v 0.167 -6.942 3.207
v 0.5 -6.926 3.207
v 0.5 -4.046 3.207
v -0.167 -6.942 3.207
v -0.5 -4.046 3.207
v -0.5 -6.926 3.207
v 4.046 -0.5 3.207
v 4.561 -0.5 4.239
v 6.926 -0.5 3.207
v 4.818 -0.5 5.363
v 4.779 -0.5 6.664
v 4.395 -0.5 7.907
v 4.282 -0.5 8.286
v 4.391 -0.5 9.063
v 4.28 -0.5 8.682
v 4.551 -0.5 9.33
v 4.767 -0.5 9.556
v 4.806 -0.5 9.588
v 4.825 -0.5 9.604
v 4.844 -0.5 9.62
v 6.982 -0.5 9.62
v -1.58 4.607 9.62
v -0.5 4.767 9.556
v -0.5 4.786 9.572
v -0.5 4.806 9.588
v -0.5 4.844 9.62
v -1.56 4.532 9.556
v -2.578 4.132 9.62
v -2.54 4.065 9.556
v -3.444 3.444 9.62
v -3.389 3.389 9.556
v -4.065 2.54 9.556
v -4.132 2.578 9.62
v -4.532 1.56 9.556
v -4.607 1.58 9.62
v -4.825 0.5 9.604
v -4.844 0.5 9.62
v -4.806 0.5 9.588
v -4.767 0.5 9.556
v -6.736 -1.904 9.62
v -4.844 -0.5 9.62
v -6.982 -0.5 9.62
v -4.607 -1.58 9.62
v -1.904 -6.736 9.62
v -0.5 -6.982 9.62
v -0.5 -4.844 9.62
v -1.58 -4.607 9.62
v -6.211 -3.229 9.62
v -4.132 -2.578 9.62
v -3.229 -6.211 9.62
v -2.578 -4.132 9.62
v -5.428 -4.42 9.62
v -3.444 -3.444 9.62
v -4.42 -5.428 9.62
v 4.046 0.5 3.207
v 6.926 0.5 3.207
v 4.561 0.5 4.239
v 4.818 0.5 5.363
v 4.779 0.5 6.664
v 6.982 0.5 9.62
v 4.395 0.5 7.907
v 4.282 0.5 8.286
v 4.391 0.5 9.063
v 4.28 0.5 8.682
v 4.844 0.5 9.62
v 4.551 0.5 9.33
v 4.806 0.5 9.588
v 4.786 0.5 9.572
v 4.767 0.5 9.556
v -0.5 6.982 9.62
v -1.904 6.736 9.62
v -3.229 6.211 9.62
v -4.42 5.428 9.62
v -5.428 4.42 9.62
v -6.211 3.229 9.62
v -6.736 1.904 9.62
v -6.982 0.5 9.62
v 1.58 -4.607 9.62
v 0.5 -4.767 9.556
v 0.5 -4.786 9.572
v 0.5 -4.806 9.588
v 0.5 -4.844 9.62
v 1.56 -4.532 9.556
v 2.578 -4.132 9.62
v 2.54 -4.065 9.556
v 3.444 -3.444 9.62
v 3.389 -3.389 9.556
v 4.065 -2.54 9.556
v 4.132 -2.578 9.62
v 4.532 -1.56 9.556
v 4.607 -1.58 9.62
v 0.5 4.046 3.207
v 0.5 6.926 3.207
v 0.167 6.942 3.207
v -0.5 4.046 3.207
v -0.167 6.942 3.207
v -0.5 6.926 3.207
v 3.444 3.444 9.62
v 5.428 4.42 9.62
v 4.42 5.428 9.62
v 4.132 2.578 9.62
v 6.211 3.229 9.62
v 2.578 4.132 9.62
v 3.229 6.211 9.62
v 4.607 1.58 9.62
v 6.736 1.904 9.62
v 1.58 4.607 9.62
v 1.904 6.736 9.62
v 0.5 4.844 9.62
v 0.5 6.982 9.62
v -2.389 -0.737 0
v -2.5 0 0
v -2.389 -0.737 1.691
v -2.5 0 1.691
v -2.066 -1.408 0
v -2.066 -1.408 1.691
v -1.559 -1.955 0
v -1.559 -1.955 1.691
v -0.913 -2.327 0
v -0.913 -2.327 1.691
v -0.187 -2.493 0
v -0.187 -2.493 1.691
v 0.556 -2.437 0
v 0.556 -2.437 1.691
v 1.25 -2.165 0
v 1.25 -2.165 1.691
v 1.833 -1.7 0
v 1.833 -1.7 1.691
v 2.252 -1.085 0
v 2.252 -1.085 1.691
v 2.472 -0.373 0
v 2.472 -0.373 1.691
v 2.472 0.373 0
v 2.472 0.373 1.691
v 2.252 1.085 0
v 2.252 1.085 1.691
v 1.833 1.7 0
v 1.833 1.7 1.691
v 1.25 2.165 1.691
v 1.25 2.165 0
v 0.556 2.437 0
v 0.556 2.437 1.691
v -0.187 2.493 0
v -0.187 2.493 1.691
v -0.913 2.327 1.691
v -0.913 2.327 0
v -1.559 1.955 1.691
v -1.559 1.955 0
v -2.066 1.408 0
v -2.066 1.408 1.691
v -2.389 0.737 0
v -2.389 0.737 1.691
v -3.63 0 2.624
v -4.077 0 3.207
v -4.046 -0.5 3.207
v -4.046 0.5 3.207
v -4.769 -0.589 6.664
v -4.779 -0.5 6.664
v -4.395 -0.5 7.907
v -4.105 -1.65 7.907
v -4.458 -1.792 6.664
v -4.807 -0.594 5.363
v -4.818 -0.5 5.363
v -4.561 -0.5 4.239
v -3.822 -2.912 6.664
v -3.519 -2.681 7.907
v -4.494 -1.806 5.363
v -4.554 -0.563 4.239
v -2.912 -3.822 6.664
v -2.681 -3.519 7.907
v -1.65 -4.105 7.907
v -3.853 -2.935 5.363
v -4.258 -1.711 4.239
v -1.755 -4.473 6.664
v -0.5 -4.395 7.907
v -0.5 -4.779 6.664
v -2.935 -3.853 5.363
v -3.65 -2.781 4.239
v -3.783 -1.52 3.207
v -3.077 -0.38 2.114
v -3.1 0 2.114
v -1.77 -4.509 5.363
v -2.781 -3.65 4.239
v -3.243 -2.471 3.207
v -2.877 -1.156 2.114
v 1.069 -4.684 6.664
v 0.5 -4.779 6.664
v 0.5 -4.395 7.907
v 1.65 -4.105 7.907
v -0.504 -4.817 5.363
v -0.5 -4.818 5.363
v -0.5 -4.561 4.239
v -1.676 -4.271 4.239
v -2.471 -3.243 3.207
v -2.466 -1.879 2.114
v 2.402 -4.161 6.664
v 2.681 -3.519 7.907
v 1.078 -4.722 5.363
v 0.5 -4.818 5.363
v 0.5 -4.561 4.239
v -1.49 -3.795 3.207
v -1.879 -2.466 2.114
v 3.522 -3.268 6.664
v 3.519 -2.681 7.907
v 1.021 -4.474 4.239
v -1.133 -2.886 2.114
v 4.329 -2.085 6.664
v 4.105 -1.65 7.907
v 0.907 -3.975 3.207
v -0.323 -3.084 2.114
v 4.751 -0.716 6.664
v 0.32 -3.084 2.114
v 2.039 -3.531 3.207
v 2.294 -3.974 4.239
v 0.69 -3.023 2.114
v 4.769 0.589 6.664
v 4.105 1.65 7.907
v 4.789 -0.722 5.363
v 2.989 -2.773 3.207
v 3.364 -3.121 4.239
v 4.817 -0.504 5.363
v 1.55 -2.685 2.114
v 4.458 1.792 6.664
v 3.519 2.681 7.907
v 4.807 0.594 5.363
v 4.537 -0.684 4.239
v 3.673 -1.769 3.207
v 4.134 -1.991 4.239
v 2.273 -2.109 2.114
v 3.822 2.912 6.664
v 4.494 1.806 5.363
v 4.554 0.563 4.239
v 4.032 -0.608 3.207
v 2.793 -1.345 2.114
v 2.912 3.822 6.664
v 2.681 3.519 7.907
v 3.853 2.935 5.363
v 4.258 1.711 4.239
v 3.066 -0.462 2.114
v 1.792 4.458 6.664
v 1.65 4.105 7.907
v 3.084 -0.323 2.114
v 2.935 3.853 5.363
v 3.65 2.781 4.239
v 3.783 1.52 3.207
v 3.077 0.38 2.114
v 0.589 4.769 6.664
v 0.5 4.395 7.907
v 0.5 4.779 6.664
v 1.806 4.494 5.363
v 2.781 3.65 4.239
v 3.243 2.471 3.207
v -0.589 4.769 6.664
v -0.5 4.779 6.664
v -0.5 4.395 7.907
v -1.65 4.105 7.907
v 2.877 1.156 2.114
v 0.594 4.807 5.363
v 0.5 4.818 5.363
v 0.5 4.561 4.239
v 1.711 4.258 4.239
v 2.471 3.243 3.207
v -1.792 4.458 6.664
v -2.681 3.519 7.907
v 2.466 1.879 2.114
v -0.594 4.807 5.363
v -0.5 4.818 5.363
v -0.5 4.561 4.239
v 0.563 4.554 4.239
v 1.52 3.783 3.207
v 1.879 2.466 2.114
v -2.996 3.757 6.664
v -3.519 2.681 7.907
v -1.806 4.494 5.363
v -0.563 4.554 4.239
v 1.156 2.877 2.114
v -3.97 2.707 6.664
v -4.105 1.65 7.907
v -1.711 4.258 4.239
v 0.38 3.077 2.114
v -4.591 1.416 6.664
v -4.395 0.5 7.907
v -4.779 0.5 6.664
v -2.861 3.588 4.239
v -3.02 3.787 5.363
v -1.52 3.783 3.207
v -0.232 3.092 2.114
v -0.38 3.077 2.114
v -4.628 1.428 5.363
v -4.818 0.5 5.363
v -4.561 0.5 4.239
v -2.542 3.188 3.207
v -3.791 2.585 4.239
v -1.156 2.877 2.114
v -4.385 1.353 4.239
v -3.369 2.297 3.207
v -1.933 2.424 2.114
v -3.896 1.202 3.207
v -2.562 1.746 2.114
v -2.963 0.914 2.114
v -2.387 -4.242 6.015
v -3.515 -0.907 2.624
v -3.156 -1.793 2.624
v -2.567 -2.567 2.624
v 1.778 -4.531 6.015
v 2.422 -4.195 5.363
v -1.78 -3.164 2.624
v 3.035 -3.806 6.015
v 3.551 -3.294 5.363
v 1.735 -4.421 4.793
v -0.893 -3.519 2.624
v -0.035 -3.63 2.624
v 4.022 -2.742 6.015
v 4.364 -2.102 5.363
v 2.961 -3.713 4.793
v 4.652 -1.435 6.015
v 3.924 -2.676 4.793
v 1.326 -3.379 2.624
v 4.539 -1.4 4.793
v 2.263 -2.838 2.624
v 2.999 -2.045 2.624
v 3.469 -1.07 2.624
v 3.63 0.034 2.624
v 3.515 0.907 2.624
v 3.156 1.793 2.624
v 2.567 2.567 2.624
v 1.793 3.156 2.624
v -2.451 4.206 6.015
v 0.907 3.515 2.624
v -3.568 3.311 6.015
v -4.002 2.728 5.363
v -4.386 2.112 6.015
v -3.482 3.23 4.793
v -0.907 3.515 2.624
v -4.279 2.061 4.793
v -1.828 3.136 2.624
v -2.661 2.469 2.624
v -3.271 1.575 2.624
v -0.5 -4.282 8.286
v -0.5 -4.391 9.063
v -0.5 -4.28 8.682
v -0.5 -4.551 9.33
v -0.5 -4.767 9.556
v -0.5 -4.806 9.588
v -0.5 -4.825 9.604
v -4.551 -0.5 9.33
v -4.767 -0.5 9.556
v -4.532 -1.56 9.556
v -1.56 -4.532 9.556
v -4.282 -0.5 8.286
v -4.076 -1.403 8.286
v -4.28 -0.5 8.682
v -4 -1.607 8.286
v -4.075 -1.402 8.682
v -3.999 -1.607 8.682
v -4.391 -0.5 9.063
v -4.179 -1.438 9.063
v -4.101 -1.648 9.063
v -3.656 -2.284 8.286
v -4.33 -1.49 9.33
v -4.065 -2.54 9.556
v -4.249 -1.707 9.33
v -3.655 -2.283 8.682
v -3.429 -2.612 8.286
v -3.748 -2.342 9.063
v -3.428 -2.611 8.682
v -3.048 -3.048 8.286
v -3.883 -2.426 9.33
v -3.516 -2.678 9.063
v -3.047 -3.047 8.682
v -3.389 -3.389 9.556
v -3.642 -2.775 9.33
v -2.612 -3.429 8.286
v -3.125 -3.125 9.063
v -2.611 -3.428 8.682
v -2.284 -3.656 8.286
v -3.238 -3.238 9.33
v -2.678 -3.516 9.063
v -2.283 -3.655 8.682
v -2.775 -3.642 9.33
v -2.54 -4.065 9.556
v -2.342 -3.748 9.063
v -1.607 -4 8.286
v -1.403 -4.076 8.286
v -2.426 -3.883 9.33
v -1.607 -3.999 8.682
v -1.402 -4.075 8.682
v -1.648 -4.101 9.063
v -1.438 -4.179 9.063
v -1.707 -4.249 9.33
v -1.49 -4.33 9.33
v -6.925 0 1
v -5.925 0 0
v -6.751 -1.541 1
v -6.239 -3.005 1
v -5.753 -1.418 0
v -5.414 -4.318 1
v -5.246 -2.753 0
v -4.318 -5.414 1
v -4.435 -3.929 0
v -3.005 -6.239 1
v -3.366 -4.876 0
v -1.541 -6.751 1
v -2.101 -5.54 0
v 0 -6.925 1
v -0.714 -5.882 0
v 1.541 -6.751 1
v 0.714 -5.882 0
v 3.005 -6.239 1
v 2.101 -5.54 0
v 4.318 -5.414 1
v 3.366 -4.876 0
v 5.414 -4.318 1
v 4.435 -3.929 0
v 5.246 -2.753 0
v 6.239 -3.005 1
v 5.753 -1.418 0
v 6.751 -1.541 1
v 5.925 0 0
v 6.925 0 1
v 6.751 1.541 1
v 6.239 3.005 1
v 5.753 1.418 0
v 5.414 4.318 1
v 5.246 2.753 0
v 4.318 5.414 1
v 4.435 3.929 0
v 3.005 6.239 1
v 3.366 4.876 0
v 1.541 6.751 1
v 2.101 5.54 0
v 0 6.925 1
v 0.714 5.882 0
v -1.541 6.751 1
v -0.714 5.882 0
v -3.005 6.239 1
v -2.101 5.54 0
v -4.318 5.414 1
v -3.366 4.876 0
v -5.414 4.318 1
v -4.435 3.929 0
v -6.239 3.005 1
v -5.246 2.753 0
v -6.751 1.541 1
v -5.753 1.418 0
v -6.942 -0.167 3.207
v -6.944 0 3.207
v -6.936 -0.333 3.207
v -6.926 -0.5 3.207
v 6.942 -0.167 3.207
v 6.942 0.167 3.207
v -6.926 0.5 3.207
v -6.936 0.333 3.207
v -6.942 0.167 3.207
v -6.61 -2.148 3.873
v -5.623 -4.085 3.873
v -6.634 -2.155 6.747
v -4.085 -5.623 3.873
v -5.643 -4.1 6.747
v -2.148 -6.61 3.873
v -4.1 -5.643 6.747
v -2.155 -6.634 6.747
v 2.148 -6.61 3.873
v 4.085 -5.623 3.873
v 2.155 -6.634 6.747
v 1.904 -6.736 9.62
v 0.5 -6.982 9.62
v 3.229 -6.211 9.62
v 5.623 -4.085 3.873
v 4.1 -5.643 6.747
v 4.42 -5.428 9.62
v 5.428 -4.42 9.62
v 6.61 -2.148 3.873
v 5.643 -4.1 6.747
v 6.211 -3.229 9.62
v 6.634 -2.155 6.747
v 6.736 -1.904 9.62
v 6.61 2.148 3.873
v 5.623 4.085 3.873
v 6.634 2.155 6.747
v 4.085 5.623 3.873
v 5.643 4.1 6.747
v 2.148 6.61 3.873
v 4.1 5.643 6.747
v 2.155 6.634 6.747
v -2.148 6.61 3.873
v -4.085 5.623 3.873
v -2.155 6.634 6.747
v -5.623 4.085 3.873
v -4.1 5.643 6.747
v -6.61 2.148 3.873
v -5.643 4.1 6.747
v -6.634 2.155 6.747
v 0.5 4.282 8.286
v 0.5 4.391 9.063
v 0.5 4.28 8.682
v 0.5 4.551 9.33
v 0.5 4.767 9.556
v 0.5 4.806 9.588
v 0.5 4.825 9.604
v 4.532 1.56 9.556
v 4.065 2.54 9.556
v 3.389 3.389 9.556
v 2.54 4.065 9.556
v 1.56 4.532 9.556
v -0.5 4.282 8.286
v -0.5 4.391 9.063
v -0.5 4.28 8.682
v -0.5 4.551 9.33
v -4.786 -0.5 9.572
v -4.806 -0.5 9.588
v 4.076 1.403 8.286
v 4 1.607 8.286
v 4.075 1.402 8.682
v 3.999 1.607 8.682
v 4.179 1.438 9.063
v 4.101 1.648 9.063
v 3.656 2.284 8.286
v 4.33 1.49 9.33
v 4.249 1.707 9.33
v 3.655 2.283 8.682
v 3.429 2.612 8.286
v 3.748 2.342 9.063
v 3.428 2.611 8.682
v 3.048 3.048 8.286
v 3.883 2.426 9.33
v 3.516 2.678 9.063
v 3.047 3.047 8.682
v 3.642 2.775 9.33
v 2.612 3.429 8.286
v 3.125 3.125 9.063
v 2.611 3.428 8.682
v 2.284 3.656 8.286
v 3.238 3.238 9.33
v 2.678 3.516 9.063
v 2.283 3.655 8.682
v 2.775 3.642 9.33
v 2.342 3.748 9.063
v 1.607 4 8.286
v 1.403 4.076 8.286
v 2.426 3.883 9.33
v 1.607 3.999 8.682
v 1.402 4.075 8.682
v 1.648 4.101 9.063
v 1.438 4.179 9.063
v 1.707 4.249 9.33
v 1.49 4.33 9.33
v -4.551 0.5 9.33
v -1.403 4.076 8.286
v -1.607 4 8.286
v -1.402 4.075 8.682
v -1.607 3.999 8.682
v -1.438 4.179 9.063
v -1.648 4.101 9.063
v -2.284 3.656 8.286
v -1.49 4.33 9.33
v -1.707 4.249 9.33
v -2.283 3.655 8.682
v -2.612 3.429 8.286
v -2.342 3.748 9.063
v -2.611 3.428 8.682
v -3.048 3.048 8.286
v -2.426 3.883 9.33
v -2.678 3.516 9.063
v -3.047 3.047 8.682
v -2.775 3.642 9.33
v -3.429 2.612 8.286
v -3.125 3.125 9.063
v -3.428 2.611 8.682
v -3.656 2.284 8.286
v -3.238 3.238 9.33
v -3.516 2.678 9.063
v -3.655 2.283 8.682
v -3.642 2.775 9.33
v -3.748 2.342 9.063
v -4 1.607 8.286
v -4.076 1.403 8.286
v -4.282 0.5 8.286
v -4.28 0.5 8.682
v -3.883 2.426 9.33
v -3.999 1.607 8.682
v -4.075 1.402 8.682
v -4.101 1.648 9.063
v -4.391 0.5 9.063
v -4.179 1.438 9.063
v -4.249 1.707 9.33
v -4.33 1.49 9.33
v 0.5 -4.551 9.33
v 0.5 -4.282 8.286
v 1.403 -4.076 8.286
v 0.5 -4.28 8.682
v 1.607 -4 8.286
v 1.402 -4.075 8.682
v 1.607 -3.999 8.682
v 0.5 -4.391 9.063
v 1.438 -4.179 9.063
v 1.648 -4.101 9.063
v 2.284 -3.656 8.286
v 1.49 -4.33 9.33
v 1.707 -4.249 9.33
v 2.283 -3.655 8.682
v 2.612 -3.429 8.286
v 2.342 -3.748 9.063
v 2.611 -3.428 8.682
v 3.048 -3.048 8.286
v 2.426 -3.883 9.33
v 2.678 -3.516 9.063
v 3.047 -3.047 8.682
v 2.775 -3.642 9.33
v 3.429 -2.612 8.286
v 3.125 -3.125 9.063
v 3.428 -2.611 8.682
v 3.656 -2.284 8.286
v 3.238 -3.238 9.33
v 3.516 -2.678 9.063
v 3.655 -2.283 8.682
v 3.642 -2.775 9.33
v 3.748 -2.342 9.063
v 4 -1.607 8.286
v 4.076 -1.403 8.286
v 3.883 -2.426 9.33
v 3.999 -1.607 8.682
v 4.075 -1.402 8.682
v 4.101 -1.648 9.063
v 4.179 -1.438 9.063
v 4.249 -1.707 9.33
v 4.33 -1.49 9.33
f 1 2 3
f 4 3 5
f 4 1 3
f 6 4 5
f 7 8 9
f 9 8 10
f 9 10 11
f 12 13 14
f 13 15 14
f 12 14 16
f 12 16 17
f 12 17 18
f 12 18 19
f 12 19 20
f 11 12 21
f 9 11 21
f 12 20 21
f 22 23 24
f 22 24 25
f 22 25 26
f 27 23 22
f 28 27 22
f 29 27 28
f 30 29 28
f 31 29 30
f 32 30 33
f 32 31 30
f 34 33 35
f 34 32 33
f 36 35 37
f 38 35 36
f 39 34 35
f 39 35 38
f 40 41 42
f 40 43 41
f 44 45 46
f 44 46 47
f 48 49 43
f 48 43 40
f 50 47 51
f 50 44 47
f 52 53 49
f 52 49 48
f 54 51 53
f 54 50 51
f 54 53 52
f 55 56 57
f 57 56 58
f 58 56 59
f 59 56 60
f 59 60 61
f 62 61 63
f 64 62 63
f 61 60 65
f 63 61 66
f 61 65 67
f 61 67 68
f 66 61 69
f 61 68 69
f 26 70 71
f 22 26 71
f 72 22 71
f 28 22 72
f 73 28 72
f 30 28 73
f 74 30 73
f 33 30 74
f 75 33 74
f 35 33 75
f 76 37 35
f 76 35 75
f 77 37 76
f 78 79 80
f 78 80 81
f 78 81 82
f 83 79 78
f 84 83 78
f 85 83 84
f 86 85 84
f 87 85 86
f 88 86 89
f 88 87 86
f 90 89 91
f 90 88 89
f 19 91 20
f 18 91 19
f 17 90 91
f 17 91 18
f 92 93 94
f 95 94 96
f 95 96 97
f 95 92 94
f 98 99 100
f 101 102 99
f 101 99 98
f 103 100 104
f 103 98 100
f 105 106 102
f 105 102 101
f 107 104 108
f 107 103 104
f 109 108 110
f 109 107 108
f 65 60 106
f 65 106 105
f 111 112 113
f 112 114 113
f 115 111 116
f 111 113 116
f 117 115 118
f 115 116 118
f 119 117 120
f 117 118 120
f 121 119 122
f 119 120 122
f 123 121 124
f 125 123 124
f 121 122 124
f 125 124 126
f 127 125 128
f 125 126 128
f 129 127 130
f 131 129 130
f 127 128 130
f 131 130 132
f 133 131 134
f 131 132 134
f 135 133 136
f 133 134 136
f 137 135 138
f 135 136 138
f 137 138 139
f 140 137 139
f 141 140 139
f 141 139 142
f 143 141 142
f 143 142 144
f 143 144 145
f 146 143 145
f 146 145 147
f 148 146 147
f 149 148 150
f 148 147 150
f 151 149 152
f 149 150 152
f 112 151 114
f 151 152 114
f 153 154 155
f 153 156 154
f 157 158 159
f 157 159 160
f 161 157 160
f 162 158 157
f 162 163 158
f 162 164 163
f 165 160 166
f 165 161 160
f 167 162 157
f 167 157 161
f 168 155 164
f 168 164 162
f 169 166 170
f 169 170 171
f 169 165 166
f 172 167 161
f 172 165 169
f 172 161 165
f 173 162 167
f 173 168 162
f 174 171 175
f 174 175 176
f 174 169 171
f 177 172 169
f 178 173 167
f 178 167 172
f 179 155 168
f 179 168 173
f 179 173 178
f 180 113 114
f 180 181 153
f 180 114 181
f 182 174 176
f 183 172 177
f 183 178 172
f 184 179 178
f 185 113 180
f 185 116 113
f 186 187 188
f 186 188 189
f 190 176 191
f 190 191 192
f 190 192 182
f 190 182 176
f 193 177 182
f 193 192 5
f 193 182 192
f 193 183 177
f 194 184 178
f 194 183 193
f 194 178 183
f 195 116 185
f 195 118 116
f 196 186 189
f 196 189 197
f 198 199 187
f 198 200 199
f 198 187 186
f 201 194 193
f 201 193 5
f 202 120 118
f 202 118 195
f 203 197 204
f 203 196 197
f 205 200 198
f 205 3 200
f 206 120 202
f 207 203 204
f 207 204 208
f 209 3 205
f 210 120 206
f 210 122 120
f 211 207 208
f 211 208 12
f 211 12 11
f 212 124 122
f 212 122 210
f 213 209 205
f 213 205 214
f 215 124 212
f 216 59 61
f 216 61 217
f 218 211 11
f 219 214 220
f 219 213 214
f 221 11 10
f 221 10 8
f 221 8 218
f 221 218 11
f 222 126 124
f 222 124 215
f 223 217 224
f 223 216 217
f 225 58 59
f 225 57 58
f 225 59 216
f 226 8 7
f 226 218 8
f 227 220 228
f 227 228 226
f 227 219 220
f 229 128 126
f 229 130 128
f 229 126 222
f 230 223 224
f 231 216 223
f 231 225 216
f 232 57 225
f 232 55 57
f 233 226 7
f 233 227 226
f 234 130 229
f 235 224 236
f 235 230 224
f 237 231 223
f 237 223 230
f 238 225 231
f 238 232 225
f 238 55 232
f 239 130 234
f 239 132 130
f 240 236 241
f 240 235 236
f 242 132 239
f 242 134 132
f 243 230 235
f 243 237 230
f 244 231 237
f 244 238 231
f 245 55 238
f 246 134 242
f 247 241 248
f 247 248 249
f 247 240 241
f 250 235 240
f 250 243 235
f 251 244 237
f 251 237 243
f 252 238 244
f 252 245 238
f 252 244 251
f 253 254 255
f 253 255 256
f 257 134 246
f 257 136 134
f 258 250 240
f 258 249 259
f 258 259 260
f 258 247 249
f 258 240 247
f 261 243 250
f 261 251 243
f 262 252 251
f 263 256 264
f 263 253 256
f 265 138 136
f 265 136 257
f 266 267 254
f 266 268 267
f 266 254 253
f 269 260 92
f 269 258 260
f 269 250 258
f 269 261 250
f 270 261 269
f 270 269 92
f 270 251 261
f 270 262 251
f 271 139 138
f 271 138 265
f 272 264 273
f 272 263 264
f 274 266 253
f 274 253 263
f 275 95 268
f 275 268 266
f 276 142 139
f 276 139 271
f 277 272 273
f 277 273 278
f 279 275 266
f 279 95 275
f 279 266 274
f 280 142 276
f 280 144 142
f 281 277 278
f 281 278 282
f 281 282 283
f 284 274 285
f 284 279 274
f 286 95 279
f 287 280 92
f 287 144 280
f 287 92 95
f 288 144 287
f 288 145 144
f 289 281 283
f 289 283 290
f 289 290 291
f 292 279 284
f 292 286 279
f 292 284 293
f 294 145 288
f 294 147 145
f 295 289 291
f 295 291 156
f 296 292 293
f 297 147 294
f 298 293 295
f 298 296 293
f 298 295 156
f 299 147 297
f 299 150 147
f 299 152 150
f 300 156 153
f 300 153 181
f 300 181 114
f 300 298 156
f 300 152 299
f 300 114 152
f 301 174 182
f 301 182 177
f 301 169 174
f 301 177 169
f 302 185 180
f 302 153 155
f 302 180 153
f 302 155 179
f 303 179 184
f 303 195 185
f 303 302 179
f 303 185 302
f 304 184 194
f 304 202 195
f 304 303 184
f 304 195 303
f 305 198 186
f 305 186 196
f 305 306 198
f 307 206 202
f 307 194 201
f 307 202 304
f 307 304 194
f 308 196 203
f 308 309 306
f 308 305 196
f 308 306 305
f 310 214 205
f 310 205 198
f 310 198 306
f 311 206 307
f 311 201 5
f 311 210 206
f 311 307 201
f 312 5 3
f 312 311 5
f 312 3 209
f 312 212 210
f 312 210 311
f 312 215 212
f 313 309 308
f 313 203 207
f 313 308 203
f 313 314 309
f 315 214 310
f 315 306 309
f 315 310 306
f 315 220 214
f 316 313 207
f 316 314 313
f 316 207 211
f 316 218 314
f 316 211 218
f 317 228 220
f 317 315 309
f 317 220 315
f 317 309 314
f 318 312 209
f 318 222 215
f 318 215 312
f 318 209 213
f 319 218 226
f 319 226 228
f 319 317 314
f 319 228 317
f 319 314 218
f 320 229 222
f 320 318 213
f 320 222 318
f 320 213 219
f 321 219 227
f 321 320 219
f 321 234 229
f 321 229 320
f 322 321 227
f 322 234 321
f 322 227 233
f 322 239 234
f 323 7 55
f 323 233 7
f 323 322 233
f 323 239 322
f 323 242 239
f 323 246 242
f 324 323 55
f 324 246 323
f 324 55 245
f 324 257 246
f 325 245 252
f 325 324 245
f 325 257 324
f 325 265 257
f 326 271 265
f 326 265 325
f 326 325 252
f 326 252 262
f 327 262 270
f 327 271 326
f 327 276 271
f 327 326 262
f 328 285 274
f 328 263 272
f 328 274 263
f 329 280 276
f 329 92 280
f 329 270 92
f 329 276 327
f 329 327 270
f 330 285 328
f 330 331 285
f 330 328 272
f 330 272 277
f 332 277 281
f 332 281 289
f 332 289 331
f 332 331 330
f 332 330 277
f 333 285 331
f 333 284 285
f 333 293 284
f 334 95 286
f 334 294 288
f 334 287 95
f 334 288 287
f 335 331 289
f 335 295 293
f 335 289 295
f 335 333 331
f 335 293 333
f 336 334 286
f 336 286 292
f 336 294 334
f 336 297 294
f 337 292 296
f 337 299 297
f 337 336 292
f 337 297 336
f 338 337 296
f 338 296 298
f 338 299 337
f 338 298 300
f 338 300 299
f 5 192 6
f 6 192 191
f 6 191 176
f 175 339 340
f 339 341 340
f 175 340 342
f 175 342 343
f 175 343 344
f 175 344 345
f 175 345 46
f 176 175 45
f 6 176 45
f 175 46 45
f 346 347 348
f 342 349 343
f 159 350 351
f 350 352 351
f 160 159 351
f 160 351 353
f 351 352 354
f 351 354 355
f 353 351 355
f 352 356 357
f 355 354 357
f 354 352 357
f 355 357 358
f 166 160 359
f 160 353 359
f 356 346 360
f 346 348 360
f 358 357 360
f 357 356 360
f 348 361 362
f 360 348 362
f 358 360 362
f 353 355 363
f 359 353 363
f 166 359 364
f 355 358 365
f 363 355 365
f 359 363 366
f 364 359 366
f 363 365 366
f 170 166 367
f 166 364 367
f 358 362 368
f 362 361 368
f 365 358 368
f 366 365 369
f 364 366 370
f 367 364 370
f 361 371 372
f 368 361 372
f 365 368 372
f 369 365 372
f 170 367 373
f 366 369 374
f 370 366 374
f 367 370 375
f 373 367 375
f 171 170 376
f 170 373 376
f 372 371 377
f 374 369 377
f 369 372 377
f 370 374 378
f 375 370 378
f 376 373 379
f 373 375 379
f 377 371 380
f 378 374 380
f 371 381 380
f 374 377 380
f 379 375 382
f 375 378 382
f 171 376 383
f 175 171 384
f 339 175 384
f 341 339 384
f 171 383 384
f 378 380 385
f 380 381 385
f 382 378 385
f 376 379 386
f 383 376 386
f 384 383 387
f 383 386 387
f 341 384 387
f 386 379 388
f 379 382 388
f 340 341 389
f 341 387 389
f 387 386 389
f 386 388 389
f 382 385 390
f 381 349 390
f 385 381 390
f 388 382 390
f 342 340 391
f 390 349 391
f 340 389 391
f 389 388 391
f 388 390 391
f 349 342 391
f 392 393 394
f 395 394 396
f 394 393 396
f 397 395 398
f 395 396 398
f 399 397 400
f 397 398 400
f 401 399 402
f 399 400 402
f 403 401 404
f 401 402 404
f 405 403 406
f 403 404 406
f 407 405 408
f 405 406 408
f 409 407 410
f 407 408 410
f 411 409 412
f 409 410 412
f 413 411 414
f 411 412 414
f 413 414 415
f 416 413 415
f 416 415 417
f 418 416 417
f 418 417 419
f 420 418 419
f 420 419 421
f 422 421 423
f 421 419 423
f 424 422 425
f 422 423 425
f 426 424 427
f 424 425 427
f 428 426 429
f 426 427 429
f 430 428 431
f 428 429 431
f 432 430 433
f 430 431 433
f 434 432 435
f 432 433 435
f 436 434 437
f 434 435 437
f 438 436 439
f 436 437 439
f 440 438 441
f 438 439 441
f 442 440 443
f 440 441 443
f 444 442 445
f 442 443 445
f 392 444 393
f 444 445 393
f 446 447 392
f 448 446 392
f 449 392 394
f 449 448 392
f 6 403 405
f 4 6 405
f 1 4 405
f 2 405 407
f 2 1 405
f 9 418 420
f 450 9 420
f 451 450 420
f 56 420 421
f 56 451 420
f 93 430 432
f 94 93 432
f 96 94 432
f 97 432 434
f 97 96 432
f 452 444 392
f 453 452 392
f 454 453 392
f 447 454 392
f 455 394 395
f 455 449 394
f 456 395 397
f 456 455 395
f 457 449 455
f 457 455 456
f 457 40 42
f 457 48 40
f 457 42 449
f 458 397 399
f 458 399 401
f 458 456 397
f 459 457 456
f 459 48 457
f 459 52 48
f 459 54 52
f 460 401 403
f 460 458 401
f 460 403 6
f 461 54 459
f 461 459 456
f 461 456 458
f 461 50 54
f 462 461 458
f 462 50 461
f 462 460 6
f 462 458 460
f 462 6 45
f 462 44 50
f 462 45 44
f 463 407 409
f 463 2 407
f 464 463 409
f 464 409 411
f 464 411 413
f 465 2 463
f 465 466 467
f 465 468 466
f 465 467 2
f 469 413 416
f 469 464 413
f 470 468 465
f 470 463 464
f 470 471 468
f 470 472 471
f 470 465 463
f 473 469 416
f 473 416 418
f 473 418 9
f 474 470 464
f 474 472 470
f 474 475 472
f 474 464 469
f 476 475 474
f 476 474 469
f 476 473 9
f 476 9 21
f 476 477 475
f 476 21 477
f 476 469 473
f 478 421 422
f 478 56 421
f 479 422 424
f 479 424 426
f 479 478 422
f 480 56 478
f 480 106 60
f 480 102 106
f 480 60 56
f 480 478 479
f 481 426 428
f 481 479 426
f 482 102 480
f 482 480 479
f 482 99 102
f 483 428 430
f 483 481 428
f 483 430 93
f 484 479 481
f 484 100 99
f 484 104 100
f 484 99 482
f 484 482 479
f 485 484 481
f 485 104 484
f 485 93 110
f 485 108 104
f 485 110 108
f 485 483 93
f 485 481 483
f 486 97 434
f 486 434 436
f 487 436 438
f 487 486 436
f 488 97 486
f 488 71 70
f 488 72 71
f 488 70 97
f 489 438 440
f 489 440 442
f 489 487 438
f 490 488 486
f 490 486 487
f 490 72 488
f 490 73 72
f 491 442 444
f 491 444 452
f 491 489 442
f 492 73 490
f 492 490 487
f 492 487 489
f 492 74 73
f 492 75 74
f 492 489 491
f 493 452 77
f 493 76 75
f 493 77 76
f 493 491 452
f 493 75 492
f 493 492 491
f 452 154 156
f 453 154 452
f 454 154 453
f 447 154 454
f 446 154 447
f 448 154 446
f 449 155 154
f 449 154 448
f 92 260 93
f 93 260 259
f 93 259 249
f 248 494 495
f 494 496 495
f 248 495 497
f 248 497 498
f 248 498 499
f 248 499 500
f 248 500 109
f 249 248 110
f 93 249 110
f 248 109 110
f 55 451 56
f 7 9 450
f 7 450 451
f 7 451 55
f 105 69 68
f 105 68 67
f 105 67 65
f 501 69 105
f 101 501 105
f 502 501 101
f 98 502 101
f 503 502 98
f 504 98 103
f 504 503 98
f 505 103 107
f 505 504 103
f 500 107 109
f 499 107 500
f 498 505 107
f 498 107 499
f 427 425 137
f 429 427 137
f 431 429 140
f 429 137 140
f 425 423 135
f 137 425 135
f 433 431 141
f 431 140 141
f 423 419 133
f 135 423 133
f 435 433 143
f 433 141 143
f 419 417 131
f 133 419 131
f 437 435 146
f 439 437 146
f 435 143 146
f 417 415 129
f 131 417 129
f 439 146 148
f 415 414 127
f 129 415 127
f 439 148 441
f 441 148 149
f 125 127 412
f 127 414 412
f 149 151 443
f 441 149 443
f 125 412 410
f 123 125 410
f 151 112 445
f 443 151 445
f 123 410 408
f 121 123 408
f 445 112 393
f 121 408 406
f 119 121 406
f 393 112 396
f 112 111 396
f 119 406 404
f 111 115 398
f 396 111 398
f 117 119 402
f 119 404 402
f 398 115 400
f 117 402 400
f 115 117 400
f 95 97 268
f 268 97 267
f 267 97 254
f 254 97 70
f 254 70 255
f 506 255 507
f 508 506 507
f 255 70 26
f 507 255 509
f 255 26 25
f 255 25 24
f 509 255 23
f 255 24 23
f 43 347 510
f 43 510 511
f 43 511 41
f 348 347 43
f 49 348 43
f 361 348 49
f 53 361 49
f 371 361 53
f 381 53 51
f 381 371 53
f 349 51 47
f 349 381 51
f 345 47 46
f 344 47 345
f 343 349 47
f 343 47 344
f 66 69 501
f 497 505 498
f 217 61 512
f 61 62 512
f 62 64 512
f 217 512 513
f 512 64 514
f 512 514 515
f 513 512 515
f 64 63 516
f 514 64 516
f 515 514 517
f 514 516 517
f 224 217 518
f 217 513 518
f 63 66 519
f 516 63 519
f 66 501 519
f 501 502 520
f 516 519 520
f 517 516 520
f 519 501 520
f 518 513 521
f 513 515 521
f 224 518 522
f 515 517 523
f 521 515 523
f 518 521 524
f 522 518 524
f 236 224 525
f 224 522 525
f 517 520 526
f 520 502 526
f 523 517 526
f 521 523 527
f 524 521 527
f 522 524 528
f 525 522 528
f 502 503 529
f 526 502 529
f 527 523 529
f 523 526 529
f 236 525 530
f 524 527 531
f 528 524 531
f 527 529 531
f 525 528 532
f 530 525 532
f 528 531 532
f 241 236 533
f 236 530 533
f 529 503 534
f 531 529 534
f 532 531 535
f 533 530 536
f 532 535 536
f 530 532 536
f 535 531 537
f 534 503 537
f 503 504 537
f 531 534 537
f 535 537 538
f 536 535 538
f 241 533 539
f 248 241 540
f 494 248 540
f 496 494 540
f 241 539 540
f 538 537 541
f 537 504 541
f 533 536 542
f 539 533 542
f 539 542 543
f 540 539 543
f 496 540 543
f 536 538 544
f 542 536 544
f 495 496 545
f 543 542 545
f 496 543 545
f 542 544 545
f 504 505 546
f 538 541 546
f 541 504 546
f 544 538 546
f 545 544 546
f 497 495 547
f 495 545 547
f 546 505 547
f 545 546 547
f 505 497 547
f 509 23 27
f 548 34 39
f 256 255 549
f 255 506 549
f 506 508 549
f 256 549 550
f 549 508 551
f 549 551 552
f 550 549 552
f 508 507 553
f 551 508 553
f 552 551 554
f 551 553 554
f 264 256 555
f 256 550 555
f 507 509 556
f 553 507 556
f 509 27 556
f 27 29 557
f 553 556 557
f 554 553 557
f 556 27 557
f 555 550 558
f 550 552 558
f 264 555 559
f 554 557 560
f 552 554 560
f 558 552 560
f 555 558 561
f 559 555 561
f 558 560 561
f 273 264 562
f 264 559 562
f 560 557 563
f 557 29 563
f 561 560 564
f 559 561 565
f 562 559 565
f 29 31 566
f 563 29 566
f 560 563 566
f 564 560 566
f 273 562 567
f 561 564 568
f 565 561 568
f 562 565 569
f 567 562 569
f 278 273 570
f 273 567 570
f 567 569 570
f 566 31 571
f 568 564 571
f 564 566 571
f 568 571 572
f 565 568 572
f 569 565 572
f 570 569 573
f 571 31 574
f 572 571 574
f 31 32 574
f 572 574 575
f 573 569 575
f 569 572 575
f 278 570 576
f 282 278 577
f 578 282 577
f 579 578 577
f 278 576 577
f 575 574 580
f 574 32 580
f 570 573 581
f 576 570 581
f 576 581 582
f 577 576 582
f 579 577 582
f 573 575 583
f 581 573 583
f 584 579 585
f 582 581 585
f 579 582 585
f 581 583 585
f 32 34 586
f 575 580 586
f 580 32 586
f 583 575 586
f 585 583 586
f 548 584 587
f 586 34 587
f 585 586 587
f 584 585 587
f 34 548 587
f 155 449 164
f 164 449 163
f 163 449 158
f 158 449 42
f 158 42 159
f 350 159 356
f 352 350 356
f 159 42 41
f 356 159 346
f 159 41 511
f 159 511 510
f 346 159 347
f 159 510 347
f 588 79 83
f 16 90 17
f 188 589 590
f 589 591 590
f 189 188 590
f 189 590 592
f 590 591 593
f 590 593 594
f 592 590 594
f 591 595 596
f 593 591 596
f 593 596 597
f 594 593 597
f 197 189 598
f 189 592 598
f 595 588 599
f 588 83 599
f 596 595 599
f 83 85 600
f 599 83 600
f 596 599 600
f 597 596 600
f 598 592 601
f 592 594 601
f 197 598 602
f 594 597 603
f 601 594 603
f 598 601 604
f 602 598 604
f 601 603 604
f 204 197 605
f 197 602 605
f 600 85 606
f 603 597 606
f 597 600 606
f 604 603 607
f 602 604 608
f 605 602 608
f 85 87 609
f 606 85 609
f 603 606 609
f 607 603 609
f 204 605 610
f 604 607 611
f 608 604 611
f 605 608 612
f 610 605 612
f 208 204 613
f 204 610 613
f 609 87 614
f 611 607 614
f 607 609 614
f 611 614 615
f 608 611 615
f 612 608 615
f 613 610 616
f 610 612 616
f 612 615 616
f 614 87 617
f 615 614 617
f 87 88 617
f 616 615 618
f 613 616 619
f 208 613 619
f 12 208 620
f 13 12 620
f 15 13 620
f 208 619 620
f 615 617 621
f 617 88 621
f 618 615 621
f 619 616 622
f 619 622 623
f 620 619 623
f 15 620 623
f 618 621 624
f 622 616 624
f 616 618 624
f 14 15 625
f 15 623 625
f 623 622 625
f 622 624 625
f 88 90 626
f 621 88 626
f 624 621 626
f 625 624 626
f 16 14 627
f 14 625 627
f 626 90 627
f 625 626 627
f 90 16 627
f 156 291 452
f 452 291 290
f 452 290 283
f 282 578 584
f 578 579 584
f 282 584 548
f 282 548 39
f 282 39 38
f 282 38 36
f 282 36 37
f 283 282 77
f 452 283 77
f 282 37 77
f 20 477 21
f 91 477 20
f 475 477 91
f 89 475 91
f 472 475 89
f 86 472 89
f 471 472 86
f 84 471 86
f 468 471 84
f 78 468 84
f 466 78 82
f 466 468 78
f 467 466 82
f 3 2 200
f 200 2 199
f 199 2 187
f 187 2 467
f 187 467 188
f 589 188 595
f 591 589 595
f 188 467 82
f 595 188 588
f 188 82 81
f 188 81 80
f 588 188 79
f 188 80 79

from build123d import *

# Parameters (mm, degrees)
POCKET_DEPTH = 6.413333


with BuildPart() as part:
    # Sketch001 → Revolution (revolve)
    with BuildSketch(Plane.XZ):
        with BuildLine():
            ThreePointArc((-4.423636, 7.90675), (-4.652325, 4.430289), (-2.5, 1.690658))
            Line((-2.5, 0), (-2.5, 1.690658))
            Line((-5.925, 0), (-2.5, 0))
            Line((-6.925, 1), (-5.925, 0))
            Line((-6.925, 1), (-7, 9.62))
            Line((-7, 9.62), (-4.87, 9.62))
            Line((-4.87, 9.62), (-4.793396, 9.555721))
            ThreePointArc((-4.423636, 7.90675), (-4.329753, 8.793744), (-4.793396, 9.555721))
        make_face()
    revolve(axis=Axis((0, 0, 0), (0, 0, 1)))

    # Sketch (on Face6 of Revolution) → Pocket (cut)
    with BuildSketch(Plane(origin=(0, 0, 9.62), x_dir=(-1, 0, 0), z_dir=(0, 0, 1))):
        Polygon((-0.5, 14.35), (-0.5, 0.5), (-14.35, 0.5), (-14.35, -0.5), (-0.5, -0.5), (-0.5, -14.35), (0.5, -14.35), (0.5, -0.5), (14.35, -0.5), (14.35, 0.5), (0.5, 0.5), (0.5, 14.35), align=None)
    extrude(amount=-POCKET_DEPTH, mode=Mode.SUBTRACT)


solid = part.part
